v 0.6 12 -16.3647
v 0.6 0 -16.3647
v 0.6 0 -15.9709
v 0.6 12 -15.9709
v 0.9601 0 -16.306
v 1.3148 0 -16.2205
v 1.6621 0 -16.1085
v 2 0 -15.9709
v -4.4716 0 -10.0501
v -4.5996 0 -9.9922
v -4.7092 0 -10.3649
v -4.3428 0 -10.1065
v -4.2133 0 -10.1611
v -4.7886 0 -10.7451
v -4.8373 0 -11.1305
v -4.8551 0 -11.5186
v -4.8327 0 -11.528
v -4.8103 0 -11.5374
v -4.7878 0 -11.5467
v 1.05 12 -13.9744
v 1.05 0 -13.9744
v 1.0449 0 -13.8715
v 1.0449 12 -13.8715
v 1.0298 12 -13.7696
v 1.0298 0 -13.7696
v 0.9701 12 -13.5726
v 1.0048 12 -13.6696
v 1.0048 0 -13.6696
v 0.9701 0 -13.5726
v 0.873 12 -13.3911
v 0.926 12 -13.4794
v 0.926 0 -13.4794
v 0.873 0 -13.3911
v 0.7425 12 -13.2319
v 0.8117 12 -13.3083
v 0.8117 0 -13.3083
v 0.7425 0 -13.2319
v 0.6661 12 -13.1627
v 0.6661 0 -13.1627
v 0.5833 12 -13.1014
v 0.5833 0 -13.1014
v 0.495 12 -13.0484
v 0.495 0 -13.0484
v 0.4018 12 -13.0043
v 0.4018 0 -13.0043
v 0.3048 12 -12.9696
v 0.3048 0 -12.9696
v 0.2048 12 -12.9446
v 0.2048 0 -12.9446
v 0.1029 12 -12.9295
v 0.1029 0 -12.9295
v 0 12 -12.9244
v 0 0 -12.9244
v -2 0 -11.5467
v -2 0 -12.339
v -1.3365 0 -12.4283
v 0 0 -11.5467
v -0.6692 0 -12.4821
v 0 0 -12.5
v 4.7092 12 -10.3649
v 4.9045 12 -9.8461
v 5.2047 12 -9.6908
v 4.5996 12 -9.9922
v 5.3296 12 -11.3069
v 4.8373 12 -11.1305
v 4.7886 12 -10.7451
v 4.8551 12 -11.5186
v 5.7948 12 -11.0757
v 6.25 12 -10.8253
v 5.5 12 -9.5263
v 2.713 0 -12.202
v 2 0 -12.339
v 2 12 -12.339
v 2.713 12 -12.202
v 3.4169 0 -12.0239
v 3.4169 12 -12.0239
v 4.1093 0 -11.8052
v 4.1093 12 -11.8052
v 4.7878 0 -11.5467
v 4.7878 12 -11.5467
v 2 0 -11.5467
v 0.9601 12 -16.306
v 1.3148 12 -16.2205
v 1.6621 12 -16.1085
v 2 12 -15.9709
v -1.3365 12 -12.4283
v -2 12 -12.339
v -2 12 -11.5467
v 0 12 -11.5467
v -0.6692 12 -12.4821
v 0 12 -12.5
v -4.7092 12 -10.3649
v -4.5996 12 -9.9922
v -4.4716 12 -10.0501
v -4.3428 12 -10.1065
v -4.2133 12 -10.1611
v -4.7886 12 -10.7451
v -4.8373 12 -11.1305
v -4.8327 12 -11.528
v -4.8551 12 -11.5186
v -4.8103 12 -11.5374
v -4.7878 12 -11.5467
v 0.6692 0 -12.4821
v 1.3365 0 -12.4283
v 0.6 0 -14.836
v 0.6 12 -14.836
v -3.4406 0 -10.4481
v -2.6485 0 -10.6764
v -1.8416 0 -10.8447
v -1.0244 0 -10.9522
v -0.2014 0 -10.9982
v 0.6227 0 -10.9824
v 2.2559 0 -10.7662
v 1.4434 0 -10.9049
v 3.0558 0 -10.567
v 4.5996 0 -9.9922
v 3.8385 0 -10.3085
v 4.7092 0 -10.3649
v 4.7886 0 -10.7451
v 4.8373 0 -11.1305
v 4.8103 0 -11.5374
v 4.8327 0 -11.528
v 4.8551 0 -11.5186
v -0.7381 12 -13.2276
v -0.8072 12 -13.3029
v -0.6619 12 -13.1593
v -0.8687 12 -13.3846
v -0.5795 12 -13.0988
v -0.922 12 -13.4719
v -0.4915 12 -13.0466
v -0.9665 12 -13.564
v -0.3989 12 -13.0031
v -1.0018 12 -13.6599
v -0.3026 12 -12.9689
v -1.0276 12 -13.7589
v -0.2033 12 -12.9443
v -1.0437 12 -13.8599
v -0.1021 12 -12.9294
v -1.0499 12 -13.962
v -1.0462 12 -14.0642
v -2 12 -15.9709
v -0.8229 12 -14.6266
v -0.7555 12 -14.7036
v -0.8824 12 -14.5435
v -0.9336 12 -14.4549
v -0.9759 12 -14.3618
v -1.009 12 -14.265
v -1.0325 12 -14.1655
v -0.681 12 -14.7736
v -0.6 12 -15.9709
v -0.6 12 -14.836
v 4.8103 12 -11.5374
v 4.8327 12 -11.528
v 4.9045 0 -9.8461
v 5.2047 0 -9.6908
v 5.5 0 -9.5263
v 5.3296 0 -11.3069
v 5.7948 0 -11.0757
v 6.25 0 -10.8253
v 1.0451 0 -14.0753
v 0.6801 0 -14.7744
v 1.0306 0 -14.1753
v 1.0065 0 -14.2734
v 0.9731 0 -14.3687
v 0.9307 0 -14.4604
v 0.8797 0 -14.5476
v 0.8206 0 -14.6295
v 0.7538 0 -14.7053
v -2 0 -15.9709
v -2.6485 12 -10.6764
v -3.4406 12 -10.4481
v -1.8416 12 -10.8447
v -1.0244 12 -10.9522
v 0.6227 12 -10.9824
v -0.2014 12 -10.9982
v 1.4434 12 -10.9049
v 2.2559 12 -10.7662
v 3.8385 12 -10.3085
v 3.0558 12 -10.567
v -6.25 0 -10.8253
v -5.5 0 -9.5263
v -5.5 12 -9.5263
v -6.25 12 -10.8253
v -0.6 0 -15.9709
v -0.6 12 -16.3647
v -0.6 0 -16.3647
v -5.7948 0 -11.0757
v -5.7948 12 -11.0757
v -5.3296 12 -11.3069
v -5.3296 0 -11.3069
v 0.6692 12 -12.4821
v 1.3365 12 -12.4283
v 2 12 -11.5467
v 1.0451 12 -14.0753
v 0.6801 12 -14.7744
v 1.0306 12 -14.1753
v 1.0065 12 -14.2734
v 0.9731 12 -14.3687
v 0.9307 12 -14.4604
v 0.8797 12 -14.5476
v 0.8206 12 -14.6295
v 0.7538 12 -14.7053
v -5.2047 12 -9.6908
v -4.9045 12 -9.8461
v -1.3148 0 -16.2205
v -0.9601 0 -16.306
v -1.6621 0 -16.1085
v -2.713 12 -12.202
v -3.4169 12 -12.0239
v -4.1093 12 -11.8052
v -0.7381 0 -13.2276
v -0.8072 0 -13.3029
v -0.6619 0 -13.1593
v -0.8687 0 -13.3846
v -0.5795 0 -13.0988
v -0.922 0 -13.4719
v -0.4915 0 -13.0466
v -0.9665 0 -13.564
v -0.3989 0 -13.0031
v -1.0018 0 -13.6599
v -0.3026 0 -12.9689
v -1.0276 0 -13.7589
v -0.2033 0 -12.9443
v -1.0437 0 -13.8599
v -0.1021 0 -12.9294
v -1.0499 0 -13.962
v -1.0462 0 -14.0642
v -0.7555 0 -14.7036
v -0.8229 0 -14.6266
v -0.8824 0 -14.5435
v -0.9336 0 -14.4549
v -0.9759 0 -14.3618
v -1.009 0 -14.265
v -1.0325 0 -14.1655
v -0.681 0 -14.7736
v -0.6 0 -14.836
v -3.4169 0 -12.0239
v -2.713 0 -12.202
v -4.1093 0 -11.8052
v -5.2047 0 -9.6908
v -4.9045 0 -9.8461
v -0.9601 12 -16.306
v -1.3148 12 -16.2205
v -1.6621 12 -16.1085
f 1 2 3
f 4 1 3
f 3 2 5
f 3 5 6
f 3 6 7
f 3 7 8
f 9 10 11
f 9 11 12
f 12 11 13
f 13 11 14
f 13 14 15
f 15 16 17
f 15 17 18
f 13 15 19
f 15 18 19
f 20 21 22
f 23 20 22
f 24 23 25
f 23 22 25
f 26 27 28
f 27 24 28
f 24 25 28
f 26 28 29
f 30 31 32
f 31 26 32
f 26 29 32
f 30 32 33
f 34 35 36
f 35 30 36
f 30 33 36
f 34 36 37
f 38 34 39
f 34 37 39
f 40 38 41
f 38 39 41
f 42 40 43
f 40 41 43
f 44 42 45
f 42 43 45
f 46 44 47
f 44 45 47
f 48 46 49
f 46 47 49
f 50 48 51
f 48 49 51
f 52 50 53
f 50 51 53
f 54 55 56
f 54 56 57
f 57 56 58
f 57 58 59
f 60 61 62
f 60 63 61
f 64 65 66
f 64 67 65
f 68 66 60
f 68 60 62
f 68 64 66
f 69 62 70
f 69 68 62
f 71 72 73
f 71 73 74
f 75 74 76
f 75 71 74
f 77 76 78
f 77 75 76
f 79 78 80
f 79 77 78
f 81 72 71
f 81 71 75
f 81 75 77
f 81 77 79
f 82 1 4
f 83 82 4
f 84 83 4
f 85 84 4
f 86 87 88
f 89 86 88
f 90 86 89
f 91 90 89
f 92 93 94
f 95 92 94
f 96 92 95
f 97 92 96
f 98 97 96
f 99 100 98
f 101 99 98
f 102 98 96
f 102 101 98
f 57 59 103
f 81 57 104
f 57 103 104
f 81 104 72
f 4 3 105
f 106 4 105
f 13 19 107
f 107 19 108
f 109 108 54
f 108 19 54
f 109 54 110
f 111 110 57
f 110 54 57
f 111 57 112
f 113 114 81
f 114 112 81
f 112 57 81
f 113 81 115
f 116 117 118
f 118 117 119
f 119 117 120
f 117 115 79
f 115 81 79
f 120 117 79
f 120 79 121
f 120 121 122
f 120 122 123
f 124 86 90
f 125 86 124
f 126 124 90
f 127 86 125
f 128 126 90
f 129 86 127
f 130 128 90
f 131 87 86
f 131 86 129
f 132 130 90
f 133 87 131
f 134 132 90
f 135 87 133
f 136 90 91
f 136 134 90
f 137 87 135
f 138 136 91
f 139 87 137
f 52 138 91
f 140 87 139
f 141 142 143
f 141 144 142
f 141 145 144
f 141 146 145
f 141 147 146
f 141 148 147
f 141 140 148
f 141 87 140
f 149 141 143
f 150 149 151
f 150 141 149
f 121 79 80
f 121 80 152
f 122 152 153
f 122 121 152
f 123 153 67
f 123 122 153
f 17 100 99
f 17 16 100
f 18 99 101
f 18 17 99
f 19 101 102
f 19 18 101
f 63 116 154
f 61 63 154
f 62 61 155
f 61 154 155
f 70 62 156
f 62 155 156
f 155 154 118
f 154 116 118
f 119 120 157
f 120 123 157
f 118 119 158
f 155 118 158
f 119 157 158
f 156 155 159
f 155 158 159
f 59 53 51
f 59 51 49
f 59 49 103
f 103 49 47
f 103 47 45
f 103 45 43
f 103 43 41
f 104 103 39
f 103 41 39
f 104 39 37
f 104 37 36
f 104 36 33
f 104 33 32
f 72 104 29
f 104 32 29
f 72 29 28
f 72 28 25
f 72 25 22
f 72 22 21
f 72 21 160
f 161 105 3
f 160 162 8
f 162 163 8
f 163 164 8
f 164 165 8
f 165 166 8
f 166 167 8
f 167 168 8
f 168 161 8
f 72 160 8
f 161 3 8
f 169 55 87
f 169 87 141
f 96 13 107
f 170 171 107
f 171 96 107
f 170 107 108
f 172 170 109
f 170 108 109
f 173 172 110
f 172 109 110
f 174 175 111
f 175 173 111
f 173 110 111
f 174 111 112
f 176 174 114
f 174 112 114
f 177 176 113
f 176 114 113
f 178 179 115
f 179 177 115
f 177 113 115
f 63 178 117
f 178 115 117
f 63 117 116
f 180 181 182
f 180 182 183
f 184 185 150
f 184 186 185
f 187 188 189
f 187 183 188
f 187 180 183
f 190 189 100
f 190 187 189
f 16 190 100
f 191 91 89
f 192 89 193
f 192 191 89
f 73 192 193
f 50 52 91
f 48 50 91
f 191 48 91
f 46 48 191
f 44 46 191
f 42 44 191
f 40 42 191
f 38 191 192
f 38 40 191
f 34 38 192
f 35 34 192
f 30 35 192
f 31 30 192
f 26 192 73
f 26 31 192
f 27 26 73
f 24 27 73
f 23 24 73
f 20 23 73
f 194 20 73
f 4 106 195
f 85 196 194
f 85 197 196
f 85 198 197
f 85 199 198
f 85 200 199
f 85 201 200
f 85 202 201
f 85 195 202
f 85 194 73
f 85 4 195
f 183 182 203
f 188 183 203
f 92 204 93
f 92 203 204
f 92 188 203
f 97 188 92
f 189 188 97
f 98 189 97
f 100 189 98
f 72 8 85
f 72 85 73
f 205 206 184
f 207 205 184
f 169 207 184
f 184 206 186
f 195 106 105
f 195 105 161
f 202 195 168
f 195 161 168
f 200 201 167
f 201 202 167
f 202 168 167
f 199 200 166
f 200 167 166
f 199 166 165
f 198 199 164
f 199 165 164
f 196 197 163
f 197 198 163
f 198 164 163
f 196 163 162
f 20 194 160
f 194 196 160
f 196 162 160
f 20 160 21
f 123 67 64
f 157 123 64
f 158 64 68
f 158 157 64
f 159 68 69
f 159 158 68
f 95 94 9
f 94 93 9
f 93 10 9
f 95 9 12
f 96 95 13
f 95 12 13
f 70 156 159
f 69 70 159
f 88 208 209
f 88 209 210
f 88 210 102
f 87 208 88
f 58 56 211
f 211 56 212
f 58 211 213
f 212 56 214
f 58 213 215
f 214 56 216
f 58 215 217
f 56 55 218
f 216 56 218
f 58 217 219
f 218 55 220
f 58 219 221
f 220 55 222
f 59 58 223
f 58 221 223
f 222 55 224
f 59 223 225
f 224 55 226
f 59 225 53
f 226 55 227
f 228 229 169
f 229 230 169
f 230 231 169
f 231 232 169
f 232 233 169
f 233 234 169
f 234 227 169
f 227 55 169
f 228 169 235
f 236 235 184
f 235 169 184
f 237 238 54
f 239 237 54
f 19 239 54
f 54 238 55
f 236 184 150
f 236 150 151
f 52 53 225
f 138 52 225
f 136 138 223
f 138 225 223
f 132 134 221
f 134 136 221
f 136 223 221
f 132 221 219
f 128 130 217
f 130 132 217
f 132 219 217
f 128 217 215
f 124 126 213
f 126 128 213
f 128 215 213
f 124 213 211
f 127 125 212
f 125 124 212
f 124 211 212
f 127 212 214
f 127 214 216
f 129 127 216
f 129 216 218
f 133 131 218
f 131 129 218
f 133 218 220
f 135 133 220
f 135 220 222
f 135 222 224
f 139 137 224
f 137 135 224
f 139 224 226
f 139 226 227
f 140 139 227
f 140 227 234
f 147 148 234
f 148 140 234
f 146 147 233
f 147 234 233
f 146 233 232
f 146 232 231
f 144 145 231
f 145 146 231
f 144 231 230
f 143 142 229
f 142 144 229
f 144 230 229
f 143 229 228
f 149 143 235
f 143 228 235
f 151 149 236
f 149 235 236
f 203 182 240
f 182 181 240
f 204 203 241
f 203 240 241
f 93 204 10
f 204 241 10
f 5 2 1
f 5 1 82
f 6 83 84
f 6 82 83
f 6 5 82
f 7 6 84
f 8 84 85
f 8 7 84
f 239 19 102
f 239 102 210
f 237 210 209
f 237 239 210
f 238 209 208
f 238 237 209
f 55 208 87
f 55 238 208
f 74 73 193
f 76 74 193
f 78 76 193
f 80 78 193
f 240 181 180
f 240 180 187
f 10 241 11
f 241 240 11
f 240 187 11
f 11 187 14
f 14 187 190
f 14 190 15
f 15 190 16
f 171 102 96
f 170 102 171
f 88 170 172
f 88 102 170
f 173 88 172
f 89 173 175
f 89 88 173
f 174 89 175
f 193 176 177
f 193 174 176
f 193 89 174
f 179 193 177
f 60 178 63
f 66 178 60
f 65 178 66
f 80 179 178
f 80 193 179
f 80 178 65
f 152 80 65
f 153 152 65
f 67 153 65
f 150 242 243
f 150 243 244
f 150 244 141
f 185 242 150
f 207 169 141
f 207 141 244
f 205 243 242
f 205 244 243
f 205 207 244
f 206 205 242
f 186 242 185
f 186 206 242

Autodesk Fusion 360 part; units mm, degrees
sketch "Sketch1" plane through (0, 0, 0) normal (0, 1, 0) x (1, 0, 0)
  circle A0 centre (0, 0) radius 11
  circle A1 centre (0, 0) radius 12.5
  line L0 (0, 0) -> (9.5756, 8.0348)
  line L1 (0, 0) -> (12.5, 0) construction
  line L2 (0, 0) -> (-9.5756, 8.0348)
  line L3 (0, 0) -> (12.5, 0) construction
  line L4 (0, 0) -> (-4.7878, 11.5467)
  line L5 (-4.7878, 11.5467) -> (4.7878, 11.5467)
  circle A2 centre (0, 11.5467) radius 4.8552
  line L6 (0, 11.5467) -> (0, 16.402)
  circle A3 centre (0, 13.9744) radius 1.05
  circle A4 centre (0, 13.9744) radius 0.5
  line L7 (0, 16.402) -> (-0.6, 16.402)
  line L8 (0, 16.402) -> (0.6, 16.402)
  line L9 (-0.6, 16.402) -> (-0.6, 14.836)
  line L10 (0.6, 16.402) -> (0.6, 14.836)
  line L11 (0, 0) -> (6.25, 10.8253)
  line L12 (0, 0) -> (12.5, 0) construction
  line L13 (0, 0) -> (-6.25, 10.8253)
  line L14 (0, 11.5467) -> (2, 11.5467)
  line L15 (0, 11.5467) -> (-2, 11.5467)
  line L16 (2, 11.5467) -> (-2, 11.5467)
  line L17 (-2, 11.5467) -> (-2, 15.9709)
  line L18 (-2, 15.9709) -> (2, 15.9709)
  line L19 (2, 15.9709) -> (2, 11.5467)
  dimension "d1" = 22
  dimension "d2" = 25
  dimension "d3" = 40
  dimension "d4" = 140
  dimension "d5" = 2.1
  dimension "d6" = 1
  dimension "d7" = 0.6
  dimension "d8" = 0.6
  dimension "d9" = 60
  dimension "d10" = 120
  dimension "d13" = 2
  dimension "d14" = 2
  dimension "d15" = 9.5756
  dimension "d16" = 4.4242
extrude "Extrude1" add sketch "Sketch1" along normal blind 12 contours A0 A1 A2 L11 | A0 A1 A2 L13 | A0 A1 L4 L5 A2 L14 L15 L16 | A0 A1 L4 A2 | A1 L5 L17 | A1 L5 L19 | A1 L6 A3 L9 L17 L18 | A2 L9 L18 | A1 L5 L6 L15 L16 L17 | A1 L5 L6 L14 L16 L19 | A1 L6 A3 L10 L18 L19 | A2 L10 L18
sketch "Sketch2" plane through (0, 0, 0) normal (0, -1, 0) x (1, 0, 0)
  line L0 (0.6, -14.836) -> (0.6, -16.3648)
  arc A0 (0.6, -16.3648) -> (2, -15.9709) centre (0, -11.5467) ccw
  line L1 (2, -15.9709) -> (2, -12.339)
  arc A1 (2, -12.339) -> (6.25, -10.8253) centre (0, 0) ccw
  line L2 (6.25, -10.8253) -> (5.5, -9.5263)
  arc A2 (-5.5, -9.5263) -> (5.5, -9.5263) centre (0, 0) ccw
  line L3 (-5.5, -9.5263) -> (-6.25, -10.8253)
  arc A3 (-6.25, -10.8253) -> (-2, -12.339) centre (0, 0) ccw
  line L4 (-2, -12.339) -> (-2, -15.9709)
  arc A4 (-2, -15.9709) -> (-0.6, -16.3648) centre (0, -11.5467) ccw
  line L5 (-0.6, -16.3648) -> (-0.6, -14.836)
  arc A5 (0.6, -14.836) -> (-0.6, -14.836) centre (0, -13.9744) ccw
  line L6 (0, -11) -> (0, -12.9244)
